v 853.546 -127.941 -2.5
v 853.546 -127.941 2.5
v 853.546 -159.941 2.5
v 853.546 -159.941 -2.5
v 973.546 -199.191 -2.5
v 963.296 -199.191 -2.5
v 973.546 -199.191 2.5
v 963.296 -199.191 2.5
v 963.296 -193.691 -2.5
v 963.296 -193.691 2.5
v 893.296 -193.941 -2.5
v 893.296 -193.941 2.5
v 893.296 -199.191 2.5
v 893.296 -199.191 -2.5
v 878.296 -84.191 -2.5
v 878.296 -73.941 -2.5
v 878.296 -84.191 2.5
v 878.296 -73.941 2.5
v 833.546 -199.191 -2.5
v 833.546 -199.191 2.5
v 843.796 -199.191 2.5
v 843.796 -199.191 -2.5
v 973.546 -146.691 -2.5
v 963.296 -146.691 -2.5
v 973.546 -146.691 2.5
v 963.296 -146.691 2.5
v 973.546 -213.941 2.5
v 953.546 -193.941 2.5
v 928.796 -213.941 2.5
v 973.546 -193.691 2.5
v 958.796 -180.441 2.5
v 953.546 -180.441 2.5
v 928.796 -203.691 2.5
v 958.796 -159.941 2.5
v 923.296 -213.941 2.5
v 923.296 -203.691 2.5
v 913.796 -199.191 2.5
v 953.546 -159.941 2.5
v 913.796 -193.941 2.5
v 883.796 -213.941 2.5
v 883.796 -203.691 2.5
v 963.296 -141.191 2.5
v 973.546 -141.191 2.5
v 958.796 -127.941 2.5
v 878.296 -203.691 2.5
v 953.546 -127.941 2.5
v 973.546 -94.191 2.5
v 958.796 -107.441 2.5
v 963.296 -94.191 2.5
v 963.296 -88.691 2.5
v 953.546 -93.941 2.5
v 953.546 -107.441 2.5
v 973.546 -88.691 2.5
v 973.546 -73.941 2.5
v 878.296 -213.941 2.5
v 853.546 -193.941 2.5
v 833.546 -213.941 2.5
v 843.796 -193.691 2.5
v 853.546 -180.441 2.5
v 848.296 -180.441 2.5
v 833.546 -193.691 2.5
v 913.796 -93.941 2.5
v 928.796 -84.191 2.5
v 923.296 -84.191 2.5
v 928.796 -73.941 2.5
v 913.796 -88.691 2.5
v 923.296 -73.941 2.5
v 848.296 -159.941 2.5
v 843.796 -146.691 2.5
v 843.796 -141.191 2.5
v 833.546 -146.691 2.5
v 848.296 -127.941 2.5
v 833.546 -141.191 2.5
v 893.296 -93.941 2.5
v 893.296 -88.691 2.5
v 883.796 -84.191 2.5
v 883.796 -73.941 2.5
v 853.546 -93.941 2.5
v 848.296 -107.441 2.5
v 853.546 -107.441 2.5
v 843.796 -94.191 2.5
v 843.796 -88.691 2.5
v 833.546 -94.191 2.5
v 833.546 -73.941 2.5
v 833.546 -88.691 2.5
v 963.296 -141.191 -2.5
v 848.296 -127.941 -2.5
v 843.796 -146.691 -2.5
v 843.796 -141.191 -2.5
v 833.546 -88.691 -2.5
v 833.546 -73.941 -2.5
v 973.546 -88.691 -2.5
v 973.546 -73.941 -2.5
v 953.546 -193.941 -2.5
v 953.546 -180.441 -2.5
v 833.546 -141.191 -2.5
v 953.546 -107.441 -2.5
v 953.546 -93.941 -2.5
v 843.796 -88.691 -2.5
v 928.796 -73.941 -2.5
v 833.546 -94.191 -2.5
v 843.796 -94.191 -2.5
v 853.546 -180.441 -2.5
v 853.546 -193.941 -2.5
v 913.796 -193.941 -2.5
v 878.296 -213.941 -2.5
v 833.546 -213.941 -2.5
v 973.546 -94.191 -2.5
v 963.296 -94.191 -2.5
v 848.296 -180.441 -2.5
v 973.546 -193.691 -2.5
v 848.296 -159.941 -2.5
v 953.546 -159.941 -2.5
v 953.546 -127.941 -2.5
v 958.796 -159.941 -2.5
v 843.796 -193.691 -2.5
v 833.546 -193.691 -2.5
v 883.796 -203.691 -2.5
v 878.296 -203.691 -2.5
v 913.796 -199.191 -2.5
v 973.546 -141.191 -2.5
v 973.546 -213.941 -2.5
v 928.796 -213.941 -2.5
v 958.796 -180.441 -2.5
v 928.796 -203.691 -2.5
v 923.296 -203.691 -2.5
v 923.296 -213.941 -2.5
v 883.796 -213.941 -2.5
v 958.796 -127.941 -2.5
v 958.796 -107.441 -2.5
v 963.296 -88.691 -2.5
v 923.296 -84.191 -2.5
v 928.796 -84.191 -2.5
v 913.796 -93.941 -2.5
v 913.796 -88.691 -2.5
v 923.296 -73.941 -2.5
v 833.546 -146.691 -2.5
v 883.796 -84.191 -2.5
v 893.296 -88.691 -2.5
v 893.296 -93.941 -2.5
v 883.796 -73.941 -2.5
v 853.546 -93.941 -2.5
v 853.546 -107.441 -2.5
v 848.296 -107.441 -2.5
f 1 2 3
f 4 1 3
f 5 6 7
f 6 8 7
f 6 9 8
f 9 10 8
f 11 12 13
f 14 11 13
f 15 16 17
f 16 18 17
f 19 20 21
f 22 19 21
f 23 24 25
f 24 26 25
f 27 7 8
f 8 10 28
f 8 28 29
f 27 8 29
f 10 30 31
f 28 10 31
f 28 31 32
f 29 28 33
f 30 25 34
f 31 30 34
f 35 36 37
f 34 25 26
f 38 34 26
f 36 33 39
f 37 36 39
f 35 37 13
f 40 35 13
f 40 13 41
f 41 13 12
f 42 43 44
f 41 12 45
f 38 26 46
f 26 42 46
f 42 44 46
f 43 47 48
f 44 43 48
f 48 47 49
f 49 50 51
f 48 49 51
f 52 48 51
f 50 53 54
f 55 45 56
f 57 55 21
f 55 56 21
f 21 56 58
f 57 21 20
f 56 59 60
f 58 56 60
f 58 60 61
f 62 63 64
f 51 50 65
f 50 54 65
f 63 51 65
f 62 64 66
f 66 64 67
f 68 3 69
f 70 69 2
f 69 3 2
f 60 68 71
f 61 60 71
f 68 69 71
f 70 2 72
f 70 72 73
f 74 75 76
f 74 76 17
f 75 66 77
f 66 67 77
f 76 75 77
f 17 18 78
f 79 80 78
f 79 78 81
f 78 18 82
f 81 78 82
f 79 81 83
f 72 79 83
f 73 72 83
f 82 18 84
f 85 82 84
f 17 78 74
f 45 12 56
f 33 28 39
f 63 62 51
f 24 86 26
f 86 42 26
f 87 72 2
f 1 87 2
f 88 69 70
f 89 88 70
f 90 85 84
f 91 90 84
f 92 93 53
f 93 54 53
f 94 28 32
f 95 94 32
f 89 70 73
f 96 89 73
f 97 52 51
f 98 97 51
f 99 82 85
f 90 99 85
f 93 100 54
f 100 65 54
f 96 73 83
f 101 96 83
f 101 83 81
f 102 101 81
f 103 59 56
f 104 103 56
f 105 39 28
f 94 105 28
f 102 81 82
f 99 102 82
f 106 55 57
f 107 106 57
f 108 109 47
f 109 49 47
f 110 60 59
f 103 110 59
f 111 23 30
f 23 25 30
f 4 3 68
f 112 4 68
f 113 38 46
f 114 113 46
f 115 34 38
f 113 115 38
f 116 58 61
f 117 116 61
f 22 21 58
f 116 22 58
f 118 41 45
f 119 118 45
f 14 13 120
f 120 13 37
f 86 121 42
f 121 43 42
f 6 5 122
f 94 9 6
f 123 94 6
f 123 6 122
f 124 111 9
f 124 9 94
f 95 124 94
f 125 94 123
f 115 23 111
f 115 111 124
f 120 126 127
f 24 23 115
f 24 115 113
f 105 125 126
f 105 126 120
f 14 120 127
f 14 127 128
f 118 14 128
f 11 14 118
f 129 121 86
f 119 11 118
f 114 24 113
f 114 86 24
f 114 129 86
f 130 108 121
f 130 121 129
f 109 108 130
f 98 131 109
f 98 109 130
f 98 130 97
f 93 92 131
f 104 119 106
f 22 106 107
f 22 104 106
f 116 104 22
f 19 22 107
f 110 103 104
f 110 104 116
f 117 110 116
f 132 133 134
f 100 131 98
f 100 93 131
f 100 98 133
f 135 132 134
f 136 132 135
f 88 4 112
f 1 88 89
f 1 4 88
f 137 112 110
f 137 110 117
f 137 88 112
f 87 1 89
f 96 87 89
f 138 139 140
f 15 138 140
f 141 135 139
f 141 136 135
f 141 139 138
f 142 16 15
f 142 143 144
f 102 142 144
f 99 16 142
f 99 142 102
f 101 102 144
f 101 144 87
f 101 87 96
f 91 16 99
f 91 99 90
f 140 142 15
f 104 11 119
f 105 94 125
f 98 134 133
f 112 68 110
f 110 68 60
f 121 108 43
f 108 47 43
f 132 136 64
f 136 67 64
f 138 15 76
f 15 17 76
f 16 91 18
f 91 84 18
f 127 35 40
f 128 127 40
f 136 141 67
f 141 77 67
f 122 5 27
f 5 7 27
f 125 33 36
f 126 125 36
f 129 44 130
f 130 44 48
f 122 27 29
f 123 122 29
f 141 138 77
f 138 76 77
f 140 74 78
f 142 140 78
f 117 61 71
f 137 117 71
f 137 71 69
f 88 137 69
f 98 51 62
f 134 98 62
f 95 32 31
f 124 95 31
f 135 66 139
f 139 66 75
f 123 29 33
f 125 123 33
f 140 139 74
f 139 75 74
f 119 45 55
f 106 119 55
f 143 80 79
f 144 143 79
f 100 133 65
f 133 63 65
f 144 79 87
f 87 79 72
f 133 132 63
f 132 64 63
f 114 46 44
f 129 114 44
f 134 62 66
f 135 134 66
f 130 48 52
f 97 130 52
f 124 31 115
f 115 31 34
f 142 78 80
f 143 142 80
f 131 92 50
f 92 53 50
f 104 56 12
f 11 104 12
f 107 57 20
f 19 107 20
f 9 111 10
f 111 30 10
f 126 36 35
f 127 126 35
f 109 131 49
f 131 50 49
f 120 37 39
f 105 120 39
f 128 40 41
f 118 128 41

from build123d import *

# Parameters (mm, degrees)
BOSS_EXTRUDE1_DEPTH = 2.5


with BuildPart() as part:
    # Sketch1 → Boss-Extrude1 (new, symmetric)
    with BuildSketch(Plane.XY):
        Polygon((833.545659386, -88.691167375), (833.545659386, -73.941167375), (878.295659386, -73.941167375), (878.295659386, -84.191167375), (883.795659386, -84.191167375), (883.795659386, -73.941167375), (923.295659386, -73.941167375), (923.295659386, -84.191167375), (928.795659386, -84.191167375), (928.795659386, -73.941167375), (973.545659386, -73.941167375), (973.545659386, -88.691167375), (963.295659386, -88.691167375), (963.295659386, -94.191167375), (973.545659386, -94.191167375), (973.545659386, -141.191167375), (963.295659386, -141.191167375), (963.295659386, -146.691167375), (973.545659386, -146.691167375), (973.545659386, -193.691167375), (963.295659386, -193.691167375), (963.295659386, -199.191167375), (973.545659386, -199.191167375), (973.545659386, -213.941167375), (928.795659386, -213.941167375), (928.795659386, -203.691167375), (923.295659386, -203.691167375), (923.295659386, -213.941167375), (883.795659386, -213.941167375), (883.795659386, -203.691167375), (878.295659386, -203.691167375), (878.295659386, -213.941167375), (833.545659386, -213.941167375), (833.545659386, -199.191167375), (843.795659386, -199.191167375), (843.795659386, -193.691167375), (833.545659386, -193.691167375), (833.545659386, -146.691167375), (843.795659386, -146.691167375), (843.795659386, -141.191167375), (833.545659386, -141.191167375), (833.545659386, -94.191167375), (843.795659386, -94.191167375), (843.795659386, -88.691167375), align=None)
        Polygon((893.295659386, -88.691167375), (893.295659386, -93.941167375), (853.545659386, -93.941167375), (853.545659386, -107.441167375), (848.295659386, -107.441167375), (848.295659386, -127.941167375), (853.545659386, -127.941167375), (853.545659386, -159.94119829), (848.295659386, -159.941167375), (848.295659386, -180.441167375), (853.545659386, -180.441167375), (853.545659386, -193.941167375), (893.295659386, -193.941167375), (893.295659386, -199.191167375), (913.795659386, -199.191167375), (913.795659386, -193.941167375), (953.545659386, -193.941167375), (953.545659386, -180.441167375), (958.795659386, -180.441167375), (958.795659386, -159.941167375), (953.545659386, -159.94119829), (953.545659386, -127.941167375), (958.795659386, -127.941167375), (958.795659386, -107.441167375), (953.545659386, -107.441167375), (953.545659386, -93.941167375), (913.795659386, -93.941167375), (913.795659386, -88.691167375), align=None, mode=Mode.SUBTRACT)
    extrude(amount=BOSS_EXTRUDE1_DEPTH, both=True)


solid = part.part
